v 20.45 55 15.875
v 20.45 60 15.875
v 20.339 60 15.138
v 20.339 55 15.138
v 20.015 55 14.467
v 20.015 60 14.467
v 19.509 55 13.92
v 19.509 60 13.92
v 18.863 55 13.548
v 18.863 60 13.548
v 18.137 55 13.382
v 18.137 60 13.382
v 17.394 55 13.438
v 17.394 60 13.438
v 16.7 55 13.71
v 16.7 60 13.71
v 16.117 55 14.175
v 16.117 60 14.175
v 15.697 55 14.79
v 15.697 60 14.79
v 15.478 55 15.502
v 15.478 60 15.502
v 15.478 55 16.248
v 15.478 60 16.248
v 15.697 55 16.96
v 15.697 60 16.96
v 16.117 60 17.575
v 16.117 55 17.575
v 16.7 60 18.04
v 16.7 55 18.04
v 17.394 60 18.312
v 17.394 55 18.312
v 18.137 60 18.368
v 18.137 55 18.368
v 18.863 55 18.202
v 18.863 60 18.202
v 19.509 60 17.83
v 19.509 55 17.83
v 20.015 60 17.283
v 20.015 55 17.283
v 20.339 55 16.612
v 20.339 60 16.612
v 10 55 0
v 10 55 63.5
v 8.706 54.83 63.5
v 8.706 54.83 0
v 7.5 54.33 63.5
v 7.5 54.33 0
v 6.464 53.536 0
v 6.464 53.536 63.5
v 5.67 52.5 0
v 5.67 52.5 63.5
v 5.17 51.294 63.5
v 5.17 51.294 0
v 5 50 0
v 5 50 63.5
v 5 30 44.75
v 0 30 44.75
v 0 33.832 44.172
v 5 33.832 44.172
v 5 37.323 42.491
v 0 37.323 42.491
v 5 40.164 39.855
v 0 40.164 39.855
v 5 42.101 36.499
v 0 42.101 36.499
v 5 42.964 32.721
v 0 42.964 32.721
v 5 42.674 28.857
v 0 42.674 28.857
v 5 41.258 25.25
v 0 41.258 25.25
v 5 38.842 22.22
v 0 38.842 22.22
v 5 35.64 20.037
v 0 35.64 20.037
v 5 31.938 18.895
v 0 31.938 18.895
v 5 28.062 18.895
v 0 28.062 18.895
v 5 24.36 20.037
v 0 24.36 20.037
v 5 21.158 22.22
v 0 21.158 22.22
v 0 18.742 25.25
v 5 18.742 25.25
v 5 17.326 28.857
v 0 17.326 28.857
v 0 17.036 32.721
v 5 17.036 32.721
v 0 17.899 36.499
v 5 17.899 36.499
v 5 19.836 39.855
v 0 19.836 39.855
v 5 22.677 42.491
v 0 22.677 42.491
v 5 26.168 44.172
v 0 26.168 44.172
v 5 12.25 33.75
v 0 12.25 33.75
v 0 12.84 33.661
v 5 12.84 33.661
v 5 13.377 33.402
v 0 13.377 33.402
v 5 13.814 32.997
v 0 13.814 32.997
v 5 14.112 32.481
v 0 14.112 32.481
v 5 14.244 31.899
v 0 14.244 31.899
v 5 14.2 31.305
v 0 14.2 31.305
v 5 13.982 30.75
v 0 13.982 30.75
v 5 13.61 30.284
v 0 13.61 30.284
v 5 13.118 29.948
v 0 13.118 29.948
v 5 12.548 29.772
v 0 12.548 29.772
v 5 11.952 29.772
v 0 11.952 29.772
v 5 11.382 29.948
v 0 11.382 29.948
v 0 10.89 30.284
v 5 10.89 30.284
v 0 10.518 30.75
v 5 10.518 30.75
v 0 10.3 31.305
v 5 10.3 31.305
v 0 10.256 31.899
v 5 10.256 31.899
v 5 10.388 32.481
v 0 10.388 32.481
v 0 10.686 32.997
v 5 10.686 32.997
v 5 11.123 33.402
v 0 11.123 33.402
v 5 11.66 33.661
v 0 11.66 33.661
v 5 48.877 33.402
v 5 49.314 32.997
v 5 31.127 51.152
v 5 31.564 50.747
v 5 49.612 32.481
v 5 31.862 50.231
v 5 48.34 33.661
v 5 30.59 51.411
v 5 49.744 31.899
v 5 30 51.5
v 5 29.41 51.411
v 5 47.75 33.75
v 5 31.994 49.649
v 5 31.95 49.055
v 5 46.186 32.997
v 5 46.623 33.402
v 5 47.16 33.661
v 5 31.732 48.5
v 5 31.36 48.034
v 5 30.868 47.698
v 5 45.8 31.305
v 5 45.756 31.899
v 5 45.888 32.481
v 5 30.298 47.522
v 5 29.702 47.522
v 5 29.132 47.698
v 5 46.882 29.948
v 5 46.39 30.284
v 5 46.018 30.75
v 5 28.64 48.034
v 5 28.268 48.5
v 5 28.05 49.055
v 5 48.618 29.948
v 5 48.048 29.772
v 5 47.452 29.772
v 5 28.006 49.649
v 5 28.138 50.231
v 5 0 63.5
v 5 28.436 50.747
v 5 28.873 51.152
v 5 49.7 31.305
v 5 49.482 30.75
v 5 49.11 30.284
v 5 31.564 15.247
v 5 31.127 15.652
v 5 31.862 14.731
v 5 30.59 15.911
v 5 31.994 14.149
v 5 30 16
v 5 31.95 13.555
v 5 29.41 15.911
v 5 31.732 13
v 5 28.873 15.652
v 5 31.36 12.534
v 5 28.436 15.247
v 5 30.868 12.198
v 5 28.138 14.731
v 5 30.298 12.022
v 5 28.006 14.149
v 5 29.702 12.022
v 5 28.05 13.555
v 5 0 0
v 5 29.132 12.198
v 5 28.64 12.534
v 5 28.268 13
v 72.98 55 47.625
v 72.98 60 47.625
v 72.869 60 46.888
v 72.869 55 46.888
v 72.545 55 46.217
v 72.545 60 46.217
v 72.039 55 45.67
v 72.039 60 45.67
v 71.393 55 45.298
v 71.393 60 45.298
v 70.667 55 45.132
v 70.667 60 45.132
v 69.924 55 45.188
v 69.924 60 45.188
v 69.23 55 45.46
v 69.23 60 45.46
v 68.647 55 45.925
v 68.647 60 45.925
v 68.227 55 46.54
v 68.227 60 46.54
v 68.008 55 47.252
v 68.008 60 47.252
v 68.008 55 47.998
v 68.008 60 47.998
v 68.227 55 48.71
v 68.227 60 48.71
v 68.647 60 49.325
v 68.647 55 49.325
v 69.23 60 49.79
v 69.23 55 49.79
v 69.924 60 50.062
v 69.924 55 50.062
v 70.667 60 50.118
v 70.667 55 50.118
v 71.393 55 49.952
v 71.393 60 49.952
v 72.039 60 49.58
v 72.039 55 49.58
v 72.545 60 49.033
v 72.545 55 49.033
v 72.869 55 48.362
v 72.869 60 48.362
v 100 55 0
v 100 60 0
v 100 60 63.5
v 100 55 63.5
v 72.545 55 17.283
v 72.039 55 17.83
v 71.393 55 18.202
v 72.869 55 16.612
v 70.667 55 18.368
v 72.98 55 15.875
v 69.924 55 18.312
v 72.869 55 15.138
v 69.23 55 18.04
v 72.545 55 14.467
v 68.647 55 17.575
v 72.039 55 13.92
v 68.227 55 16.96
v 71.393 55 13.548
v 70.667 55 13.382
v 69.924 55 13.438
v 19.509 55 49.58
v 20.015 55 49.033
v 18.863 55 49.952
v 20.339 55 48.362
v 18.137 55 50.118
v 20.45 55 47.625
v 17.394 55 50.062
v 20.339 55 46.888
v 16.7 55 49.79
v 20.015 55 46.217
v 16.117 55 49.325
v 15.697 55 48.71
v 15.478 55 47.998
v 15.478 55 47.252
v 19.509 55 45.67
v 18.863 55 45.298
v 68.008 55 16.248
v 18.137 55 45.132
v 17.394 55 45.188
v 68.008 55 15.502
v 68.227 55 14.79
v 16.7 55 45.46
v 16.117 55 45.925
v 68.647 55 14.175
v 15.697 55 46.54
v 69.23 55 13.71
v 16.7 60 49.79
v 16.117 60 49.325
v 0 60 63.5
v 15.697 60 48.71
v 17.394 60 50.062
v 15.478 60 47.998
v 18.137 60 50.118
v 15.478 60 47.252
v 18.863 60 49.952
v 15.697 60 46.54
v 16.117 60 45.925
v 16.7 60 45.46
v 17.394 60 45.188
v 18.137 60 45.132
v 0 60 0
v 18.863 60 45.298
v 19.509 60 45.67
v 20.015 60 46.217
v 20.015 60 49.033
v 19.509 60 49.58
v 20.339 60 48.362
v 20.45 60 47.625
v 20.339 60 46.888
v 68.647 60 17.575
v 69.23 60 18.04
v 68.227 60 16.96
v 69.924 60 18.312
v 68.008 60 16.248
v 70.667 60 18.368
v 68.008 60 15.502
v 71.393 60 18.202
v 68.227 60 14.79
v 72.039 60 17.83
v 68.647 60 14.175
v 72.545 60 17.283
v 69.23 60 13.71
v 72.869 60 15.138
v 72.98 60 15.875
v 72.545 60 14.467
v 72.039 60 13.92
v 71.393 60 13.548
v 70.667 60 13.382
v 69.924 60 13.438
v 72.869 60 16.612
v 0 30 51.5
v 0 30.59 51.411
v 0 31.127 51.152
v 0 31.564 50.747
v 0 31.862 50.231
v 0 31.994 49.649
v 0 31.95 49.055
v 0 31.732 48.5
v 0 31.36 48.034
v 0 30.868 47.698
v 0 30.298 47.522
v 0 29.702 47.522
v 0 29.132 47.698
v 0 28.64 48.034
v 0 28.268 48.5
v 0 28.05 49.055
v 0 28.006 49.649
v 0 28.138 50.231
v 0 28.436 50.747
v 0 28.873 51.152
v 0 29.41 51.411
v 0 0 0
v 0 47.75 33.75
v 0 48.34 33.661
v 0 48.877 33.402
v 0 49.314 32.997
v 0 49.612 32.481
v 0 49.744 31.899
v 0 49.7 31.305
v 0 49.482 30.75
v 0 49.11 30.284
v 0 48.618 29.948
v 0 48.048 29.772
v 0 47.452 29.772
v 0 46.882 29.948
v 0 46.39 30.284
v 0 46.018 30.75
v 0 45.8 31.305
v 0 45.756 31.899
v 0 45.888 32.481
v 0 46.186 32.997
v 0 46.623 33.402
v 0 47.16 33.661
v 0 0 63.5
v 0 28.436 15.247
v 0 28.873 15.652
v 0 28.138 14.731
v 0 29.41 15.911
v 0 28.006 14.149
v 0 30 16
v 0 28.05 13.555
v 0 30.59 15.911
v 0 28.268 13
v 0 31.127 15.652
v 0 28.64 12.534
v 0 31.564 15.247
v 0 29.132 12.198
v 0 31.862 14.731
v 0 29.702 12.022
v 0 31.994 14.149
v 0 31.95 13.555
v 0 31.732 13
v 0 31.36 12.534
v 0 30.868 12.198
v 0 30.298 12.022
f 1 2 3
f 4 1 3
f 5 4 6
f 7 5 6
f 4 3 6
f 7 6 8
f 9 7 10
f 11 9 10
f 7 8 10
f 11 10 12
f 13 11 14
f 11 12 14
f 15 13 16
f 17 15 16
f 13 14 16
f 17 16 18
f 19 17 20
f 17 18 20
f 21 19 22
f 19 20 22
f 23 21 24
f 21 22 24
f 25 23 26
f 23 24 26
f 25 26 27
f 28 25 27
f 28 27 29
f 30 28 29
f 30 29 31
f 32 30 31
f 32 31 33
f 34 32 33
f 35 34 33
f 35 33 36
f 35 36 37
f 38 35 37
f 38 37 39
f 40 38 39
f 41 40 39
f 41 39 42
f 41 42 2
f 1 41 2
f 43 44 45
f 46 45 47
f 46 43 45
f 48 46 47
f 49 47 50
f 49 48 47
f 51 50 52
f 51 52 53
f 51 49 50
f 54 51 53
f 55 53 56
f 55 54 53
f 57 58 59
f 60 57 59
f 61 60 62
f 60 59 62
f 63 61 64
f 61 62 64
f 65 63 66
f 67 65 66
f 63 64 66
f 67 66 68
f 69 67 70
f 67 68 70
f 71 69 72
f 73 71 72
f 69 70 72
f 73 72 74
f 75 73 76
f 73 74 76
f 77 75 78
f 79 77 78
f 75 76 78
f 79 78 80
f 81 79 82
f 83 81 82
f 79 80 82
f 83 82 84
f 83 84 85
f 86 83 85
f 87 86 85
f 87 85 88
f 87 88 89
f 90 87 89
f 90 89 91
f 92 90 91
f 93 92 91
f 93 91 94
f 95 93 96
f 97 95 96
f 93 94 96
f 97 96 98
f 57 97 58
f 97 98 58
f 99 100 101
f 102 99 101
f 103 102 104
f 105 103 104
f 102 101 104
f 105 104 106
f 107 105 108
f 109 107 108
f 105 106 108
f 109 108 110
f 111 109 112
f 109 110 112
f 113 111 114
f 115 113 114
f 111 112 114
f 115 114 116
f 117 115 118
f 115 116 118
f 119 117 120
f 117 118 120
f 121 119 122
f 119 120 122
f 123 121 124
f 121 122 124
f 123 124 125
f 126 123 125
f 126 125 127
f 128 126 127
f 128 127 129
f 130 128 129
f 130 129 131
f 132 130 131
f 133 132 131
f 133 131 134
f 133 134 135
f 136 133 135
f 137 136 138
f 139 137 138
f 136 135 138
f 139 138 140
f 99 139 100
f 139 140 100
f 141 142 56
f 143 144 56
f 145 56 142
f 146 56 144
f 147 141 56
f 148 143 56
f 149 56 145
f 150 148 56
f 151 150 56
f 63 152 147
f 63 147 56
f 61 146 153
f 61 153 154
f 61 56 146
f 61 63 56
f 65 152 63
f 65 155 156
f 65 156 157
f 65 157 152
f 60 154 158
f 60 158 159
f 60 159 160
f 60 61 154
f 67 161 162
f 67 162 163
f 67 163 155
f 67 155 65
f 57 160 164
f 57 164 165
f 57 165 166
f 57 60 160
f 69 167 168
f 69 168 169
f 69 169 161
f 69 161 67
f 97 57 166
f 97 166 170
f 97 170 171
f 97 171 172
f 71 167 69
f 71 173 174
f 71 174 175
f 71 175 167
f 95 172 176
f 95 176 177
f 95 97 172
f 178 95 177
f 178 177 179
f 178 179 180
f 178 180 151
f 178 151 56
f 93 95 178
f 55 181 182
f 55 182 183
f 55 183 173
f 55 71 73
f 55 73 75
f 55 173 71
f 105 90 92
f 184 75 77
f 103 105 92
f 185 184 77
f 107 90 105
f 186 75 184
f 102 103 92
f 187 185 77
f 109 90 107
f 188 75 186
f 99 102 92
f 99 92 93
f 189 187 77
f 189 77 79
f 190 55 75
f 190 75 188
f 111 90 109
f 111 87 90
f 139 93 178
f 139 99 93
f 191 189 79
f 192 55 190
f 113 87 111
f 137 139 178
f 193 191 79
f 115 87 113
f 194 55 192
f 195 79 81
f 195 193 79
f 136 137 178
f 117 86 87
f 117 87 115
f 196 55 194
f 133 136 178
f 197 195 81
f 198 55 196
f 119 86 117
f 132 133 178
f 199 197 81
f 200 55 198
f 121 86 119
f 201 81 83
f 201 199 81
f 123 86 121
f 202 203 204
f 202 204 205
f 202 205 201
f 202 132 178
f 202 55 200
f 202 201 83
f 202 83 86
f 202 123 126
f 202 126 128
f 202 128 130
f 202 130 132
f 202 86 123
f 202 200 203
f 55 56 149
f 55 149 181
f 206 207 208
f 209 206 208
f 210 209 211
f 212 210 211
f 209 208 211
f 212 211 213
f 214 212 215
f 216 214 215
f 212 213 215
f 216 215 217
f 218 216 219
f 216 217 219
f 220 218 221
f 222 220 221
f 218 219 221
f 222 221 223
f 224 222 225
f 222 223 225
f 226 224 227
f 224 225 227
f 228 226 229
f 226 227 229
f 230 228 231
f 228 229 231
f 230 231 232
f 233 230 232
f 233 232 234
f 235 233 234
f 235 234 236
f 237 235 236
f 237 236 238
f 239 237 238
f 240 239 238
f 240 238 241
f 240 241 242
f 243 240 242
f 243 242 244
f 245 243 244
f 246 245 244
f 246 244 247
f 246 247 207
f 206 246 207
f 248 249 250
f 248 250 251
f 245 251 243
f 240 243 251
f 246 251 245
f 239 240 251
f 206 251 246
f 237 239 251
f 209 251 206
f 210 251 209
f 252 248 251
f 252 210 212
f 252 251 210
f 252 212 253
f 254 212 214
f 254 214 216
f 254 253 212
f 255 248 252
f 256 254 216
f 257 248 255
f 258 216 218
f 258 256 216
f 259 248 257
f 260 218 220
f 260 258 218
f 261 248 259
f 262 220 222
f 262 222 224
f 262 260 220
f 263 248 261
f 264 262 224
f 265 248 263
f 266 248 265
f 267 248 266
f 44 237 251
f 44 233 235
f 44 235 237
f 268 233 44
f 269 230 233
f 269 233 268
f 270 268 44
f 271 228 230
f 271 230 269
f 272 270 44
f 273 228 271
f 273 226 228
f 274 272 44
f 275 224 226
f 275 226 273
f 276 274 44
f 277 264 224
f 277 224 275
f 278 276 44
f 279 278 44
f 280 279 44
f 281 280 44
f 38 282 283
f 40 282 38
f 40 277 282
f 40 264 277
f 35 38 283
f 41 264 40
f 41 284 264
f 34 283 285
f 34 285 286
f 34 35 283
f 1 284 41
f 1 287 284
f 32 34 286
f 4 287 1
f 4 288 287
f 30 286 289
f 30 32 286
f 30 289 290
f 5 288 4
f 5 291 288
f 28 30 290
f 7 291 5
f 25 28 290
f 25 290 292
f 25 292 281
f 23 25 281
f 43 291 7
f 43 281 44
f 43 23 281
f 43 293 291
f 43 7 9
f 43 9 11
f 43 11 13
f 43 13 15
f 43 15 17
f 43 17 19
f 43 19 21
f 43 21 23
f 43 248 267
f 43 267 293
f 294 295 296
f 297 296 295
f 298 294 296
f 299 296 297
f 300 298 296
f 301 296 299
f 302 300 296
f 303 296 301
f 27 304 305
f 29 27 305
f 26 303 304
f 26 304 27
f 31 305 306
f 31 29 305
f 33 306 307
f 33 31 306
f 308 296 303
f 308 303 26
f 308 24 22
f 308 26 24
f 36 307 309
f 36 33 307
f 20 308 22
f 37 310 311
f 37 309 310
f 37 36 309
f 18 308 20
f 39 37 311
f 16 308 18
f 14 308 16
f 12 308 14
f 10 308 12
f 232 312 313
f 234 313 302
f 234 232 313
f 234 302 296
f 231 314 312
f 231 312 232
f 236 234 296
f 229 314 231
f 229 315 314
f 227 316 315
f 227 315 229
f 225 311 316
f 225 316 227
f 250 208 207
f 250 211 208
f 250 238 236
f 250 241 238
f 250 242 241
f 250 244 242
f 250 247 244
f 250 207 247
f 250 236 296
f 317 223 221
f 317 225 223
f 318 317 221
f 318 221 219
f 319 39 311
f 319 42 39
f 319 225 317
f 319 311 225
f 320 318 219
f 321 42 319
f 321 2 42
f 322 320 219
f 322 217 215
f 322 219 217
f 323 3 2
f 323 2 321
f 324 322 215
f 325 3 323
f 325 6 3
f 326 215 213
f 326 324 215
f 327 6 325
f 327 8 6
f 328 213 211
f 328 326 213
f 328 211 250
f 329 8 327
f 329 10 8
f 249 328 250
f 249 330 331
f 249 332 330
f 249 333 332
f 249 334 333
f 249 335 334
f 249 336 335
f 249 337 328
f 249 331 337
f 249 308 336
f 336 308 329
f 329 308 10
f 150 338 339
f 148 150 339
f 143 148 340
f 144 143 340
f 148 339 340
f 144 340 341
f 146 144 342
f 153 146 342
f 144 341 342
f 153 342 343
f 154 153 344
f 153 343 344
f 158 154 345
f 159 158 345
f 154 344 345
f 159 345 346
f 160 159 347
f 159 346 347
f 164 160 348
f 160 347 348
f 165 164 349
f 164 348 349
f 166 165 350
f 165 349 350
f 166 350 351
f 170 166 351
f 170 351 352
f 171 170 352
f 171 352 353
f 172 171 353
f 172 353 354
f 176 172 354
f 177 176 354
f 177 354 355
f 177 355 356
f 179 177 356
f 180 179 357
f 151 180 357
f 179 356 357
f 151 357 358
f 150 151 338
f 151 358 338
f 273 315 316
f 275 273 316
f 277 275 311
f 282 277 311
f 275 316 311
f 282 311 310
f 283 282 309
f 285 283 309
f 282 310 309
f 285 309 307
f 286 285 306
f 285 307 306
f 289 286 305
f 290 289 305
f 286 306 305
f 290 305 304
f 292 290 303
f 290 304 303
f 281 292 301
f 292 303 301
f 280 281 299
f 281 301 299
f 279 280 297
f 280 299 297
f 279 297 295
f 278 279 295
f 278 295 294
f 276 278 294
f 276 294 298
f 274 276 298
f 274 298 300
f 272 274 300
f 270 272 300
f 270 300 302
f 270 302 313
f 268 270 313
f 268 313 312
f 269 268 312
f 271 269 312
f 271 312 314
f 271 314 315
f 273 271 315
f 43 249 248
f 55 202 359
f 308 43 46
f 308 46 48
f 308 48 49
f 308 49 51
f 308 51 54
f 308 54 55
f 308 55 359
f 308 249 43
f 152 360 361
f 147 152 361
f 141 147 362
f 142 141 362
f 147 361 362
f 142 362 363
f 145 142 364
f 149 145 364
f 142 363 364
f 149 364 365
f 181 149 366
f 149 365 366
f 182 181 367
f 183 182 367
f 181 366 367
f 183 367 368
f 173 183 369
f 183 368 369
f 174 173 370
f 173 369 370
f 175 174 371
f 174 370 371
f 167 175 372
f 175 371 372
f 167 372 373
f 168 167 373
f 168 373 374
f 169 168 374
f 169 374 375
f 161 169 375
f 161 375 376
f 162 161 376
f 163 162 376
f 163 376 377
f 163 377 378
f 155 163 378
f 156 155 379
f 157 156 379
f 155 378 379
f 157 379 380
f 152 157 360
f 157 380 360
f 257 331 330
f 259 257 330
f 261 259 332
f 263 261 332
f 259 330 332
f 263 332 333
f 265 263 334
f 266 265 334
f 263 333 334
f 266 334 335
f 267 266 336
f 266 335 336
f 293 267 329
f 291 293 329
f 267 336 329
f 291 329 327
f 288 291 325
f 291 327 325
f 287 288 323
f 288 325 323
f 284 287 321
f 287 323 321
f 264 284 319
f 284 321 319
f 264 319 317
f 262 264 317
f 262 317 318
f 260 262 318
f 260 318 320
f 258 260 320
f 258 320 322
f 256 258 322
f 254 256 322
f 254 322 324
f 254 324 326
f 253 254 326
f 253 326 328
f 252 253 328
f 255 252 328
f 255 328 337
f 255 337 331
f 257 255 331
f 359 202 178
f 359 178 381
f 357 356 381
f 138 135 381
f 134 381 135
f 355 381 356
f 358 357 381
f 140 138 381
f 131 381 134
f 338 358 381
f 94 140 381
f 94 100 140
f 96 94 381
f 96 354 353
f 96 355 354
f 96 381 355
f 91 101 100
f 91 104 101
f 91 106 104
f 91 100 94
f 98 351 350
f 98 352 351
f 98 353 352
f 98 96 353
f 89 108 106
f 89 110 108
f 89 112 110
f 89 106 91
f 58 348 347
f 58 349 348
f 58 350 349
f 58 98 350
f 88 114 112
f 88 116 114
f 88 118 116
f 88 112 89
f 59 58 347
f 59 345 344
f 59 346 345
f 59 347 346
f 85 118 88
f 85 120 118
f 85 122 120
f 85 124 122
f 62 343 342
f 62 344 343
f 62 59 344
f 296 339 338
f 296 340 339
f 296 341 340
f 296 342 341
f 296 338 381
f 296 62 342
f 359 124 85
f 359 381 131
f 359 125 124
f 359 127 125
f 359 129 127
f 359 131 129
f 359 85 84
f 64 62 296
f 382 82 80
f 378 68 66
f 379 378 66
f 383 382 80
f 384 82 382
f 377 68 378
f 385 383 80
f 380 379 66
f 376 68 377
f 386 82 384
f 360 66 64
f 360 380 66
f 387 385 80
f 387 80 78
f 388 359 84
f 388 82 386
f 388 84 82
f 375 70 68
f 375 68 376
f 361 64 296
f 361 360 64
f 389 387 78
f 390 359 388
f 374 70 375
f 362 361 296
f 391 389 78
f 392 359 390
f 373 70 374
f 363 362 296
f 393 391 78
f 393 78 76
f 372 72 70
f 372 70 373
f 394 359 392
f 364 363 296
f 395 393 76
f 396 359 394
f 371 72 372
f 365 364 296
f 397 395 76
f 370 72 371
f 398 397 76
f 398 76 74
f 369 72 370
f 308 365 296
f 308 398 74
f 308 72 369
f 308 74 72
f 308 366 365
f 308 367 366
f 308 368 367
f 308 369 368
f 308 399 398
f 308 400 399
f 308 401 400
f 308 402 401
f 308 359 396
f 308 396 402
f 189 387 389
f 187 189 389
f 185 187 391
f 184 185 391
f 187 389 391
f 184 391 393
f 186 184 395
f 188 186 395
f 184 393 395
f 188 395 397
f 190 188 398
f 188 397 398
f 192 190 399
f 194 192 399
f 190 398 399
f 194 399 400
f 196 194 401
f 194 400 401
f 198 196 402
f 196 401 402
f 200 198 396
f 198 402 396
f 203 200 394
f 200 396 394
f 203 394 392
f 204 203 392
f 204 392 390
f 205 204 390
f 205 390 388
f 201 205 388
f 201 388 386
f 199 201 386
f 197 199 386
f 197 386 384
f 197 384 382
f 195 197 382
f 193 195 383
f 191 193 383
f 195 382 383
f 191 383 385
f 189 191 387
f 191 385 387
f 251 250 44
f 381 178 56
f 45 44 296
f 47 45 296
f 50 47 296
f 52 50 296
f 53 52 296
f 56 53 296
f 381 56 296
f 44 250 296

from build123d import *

# Parameters (mm, degrees)
BOSS_EXTRUDE1_DEPTH = 63.5
SKETCH2_R           = 13
SKETCH2_R_2         = 2
CUT_EXTRUDE1_DEPTH  = 5
SKETCH4_R           = 2.5
CUT_EXTRUDE3_DEPTH  = 10


with BuildPart() as part:
    # Sketch1 → Boss-Extrude1 (new body)
    with BuildSketch(Plane.XY):
        with BuildLine():
            Line((0, 0), (0, 60))
            Line((0, 60), (100, 60))
            Line((100, 60), (100, 55))
            Line((100, 55), (10, 55))
            ThreePointArc((10, 55), (6.464466094, 53.535533906), (5, 50))
            Line((5, 50), (5, 0))
            Line((5, 0), (0, 0))
        make_face()
    extrude(amount=BOSS_EXTRUDE1_DEPTH)

    # Sketch2 → Cut-Extrude1 (cut)
    with BuildSketch(Plane.ZY):
        with Locations((31.75, 30)):
            Circle(SKETCH2_R)
        with Locations((49.5, 30)):
            Circle(SKETCH2_R_2)
        with Locations((31.75, 12.25)):
            Circle(SKETCH2_R_2)
        with Locations((14, 30)):
            Circle(SKETCH2_R_2)
        with Locations((31.75, 47.75)):
            Circle(SKETCH2_R_2)
    extrude(amount=-CUT_EXTRUDE1_DEPTH, mode=Mode.SUBTRACT)

    # Sketch4 → Cut-Extrude3 (cut)
    with BuildSketch(Plane(origin=(0, 60, 0), x_dir=(1, 0, 0), z_dir=(0, 1, 0))):
        with Locations((70.47984065, -47.625)):
            Circle(SKETCH4_R)
        with Locations((17.94984065, -47.625)):
            Circle(SKETCH4_R)
        with Locations((17.94984065, -15.875)):
            Circle(SKETCH4_R)
        with Locations((70.47984065, -15.875)):
            Circle(SKETCH4_R)
    extrude(amount=-CUT_EXTRUDE3_DEPTH, mode=Mode.SUBTRACT)


solid = part.part
